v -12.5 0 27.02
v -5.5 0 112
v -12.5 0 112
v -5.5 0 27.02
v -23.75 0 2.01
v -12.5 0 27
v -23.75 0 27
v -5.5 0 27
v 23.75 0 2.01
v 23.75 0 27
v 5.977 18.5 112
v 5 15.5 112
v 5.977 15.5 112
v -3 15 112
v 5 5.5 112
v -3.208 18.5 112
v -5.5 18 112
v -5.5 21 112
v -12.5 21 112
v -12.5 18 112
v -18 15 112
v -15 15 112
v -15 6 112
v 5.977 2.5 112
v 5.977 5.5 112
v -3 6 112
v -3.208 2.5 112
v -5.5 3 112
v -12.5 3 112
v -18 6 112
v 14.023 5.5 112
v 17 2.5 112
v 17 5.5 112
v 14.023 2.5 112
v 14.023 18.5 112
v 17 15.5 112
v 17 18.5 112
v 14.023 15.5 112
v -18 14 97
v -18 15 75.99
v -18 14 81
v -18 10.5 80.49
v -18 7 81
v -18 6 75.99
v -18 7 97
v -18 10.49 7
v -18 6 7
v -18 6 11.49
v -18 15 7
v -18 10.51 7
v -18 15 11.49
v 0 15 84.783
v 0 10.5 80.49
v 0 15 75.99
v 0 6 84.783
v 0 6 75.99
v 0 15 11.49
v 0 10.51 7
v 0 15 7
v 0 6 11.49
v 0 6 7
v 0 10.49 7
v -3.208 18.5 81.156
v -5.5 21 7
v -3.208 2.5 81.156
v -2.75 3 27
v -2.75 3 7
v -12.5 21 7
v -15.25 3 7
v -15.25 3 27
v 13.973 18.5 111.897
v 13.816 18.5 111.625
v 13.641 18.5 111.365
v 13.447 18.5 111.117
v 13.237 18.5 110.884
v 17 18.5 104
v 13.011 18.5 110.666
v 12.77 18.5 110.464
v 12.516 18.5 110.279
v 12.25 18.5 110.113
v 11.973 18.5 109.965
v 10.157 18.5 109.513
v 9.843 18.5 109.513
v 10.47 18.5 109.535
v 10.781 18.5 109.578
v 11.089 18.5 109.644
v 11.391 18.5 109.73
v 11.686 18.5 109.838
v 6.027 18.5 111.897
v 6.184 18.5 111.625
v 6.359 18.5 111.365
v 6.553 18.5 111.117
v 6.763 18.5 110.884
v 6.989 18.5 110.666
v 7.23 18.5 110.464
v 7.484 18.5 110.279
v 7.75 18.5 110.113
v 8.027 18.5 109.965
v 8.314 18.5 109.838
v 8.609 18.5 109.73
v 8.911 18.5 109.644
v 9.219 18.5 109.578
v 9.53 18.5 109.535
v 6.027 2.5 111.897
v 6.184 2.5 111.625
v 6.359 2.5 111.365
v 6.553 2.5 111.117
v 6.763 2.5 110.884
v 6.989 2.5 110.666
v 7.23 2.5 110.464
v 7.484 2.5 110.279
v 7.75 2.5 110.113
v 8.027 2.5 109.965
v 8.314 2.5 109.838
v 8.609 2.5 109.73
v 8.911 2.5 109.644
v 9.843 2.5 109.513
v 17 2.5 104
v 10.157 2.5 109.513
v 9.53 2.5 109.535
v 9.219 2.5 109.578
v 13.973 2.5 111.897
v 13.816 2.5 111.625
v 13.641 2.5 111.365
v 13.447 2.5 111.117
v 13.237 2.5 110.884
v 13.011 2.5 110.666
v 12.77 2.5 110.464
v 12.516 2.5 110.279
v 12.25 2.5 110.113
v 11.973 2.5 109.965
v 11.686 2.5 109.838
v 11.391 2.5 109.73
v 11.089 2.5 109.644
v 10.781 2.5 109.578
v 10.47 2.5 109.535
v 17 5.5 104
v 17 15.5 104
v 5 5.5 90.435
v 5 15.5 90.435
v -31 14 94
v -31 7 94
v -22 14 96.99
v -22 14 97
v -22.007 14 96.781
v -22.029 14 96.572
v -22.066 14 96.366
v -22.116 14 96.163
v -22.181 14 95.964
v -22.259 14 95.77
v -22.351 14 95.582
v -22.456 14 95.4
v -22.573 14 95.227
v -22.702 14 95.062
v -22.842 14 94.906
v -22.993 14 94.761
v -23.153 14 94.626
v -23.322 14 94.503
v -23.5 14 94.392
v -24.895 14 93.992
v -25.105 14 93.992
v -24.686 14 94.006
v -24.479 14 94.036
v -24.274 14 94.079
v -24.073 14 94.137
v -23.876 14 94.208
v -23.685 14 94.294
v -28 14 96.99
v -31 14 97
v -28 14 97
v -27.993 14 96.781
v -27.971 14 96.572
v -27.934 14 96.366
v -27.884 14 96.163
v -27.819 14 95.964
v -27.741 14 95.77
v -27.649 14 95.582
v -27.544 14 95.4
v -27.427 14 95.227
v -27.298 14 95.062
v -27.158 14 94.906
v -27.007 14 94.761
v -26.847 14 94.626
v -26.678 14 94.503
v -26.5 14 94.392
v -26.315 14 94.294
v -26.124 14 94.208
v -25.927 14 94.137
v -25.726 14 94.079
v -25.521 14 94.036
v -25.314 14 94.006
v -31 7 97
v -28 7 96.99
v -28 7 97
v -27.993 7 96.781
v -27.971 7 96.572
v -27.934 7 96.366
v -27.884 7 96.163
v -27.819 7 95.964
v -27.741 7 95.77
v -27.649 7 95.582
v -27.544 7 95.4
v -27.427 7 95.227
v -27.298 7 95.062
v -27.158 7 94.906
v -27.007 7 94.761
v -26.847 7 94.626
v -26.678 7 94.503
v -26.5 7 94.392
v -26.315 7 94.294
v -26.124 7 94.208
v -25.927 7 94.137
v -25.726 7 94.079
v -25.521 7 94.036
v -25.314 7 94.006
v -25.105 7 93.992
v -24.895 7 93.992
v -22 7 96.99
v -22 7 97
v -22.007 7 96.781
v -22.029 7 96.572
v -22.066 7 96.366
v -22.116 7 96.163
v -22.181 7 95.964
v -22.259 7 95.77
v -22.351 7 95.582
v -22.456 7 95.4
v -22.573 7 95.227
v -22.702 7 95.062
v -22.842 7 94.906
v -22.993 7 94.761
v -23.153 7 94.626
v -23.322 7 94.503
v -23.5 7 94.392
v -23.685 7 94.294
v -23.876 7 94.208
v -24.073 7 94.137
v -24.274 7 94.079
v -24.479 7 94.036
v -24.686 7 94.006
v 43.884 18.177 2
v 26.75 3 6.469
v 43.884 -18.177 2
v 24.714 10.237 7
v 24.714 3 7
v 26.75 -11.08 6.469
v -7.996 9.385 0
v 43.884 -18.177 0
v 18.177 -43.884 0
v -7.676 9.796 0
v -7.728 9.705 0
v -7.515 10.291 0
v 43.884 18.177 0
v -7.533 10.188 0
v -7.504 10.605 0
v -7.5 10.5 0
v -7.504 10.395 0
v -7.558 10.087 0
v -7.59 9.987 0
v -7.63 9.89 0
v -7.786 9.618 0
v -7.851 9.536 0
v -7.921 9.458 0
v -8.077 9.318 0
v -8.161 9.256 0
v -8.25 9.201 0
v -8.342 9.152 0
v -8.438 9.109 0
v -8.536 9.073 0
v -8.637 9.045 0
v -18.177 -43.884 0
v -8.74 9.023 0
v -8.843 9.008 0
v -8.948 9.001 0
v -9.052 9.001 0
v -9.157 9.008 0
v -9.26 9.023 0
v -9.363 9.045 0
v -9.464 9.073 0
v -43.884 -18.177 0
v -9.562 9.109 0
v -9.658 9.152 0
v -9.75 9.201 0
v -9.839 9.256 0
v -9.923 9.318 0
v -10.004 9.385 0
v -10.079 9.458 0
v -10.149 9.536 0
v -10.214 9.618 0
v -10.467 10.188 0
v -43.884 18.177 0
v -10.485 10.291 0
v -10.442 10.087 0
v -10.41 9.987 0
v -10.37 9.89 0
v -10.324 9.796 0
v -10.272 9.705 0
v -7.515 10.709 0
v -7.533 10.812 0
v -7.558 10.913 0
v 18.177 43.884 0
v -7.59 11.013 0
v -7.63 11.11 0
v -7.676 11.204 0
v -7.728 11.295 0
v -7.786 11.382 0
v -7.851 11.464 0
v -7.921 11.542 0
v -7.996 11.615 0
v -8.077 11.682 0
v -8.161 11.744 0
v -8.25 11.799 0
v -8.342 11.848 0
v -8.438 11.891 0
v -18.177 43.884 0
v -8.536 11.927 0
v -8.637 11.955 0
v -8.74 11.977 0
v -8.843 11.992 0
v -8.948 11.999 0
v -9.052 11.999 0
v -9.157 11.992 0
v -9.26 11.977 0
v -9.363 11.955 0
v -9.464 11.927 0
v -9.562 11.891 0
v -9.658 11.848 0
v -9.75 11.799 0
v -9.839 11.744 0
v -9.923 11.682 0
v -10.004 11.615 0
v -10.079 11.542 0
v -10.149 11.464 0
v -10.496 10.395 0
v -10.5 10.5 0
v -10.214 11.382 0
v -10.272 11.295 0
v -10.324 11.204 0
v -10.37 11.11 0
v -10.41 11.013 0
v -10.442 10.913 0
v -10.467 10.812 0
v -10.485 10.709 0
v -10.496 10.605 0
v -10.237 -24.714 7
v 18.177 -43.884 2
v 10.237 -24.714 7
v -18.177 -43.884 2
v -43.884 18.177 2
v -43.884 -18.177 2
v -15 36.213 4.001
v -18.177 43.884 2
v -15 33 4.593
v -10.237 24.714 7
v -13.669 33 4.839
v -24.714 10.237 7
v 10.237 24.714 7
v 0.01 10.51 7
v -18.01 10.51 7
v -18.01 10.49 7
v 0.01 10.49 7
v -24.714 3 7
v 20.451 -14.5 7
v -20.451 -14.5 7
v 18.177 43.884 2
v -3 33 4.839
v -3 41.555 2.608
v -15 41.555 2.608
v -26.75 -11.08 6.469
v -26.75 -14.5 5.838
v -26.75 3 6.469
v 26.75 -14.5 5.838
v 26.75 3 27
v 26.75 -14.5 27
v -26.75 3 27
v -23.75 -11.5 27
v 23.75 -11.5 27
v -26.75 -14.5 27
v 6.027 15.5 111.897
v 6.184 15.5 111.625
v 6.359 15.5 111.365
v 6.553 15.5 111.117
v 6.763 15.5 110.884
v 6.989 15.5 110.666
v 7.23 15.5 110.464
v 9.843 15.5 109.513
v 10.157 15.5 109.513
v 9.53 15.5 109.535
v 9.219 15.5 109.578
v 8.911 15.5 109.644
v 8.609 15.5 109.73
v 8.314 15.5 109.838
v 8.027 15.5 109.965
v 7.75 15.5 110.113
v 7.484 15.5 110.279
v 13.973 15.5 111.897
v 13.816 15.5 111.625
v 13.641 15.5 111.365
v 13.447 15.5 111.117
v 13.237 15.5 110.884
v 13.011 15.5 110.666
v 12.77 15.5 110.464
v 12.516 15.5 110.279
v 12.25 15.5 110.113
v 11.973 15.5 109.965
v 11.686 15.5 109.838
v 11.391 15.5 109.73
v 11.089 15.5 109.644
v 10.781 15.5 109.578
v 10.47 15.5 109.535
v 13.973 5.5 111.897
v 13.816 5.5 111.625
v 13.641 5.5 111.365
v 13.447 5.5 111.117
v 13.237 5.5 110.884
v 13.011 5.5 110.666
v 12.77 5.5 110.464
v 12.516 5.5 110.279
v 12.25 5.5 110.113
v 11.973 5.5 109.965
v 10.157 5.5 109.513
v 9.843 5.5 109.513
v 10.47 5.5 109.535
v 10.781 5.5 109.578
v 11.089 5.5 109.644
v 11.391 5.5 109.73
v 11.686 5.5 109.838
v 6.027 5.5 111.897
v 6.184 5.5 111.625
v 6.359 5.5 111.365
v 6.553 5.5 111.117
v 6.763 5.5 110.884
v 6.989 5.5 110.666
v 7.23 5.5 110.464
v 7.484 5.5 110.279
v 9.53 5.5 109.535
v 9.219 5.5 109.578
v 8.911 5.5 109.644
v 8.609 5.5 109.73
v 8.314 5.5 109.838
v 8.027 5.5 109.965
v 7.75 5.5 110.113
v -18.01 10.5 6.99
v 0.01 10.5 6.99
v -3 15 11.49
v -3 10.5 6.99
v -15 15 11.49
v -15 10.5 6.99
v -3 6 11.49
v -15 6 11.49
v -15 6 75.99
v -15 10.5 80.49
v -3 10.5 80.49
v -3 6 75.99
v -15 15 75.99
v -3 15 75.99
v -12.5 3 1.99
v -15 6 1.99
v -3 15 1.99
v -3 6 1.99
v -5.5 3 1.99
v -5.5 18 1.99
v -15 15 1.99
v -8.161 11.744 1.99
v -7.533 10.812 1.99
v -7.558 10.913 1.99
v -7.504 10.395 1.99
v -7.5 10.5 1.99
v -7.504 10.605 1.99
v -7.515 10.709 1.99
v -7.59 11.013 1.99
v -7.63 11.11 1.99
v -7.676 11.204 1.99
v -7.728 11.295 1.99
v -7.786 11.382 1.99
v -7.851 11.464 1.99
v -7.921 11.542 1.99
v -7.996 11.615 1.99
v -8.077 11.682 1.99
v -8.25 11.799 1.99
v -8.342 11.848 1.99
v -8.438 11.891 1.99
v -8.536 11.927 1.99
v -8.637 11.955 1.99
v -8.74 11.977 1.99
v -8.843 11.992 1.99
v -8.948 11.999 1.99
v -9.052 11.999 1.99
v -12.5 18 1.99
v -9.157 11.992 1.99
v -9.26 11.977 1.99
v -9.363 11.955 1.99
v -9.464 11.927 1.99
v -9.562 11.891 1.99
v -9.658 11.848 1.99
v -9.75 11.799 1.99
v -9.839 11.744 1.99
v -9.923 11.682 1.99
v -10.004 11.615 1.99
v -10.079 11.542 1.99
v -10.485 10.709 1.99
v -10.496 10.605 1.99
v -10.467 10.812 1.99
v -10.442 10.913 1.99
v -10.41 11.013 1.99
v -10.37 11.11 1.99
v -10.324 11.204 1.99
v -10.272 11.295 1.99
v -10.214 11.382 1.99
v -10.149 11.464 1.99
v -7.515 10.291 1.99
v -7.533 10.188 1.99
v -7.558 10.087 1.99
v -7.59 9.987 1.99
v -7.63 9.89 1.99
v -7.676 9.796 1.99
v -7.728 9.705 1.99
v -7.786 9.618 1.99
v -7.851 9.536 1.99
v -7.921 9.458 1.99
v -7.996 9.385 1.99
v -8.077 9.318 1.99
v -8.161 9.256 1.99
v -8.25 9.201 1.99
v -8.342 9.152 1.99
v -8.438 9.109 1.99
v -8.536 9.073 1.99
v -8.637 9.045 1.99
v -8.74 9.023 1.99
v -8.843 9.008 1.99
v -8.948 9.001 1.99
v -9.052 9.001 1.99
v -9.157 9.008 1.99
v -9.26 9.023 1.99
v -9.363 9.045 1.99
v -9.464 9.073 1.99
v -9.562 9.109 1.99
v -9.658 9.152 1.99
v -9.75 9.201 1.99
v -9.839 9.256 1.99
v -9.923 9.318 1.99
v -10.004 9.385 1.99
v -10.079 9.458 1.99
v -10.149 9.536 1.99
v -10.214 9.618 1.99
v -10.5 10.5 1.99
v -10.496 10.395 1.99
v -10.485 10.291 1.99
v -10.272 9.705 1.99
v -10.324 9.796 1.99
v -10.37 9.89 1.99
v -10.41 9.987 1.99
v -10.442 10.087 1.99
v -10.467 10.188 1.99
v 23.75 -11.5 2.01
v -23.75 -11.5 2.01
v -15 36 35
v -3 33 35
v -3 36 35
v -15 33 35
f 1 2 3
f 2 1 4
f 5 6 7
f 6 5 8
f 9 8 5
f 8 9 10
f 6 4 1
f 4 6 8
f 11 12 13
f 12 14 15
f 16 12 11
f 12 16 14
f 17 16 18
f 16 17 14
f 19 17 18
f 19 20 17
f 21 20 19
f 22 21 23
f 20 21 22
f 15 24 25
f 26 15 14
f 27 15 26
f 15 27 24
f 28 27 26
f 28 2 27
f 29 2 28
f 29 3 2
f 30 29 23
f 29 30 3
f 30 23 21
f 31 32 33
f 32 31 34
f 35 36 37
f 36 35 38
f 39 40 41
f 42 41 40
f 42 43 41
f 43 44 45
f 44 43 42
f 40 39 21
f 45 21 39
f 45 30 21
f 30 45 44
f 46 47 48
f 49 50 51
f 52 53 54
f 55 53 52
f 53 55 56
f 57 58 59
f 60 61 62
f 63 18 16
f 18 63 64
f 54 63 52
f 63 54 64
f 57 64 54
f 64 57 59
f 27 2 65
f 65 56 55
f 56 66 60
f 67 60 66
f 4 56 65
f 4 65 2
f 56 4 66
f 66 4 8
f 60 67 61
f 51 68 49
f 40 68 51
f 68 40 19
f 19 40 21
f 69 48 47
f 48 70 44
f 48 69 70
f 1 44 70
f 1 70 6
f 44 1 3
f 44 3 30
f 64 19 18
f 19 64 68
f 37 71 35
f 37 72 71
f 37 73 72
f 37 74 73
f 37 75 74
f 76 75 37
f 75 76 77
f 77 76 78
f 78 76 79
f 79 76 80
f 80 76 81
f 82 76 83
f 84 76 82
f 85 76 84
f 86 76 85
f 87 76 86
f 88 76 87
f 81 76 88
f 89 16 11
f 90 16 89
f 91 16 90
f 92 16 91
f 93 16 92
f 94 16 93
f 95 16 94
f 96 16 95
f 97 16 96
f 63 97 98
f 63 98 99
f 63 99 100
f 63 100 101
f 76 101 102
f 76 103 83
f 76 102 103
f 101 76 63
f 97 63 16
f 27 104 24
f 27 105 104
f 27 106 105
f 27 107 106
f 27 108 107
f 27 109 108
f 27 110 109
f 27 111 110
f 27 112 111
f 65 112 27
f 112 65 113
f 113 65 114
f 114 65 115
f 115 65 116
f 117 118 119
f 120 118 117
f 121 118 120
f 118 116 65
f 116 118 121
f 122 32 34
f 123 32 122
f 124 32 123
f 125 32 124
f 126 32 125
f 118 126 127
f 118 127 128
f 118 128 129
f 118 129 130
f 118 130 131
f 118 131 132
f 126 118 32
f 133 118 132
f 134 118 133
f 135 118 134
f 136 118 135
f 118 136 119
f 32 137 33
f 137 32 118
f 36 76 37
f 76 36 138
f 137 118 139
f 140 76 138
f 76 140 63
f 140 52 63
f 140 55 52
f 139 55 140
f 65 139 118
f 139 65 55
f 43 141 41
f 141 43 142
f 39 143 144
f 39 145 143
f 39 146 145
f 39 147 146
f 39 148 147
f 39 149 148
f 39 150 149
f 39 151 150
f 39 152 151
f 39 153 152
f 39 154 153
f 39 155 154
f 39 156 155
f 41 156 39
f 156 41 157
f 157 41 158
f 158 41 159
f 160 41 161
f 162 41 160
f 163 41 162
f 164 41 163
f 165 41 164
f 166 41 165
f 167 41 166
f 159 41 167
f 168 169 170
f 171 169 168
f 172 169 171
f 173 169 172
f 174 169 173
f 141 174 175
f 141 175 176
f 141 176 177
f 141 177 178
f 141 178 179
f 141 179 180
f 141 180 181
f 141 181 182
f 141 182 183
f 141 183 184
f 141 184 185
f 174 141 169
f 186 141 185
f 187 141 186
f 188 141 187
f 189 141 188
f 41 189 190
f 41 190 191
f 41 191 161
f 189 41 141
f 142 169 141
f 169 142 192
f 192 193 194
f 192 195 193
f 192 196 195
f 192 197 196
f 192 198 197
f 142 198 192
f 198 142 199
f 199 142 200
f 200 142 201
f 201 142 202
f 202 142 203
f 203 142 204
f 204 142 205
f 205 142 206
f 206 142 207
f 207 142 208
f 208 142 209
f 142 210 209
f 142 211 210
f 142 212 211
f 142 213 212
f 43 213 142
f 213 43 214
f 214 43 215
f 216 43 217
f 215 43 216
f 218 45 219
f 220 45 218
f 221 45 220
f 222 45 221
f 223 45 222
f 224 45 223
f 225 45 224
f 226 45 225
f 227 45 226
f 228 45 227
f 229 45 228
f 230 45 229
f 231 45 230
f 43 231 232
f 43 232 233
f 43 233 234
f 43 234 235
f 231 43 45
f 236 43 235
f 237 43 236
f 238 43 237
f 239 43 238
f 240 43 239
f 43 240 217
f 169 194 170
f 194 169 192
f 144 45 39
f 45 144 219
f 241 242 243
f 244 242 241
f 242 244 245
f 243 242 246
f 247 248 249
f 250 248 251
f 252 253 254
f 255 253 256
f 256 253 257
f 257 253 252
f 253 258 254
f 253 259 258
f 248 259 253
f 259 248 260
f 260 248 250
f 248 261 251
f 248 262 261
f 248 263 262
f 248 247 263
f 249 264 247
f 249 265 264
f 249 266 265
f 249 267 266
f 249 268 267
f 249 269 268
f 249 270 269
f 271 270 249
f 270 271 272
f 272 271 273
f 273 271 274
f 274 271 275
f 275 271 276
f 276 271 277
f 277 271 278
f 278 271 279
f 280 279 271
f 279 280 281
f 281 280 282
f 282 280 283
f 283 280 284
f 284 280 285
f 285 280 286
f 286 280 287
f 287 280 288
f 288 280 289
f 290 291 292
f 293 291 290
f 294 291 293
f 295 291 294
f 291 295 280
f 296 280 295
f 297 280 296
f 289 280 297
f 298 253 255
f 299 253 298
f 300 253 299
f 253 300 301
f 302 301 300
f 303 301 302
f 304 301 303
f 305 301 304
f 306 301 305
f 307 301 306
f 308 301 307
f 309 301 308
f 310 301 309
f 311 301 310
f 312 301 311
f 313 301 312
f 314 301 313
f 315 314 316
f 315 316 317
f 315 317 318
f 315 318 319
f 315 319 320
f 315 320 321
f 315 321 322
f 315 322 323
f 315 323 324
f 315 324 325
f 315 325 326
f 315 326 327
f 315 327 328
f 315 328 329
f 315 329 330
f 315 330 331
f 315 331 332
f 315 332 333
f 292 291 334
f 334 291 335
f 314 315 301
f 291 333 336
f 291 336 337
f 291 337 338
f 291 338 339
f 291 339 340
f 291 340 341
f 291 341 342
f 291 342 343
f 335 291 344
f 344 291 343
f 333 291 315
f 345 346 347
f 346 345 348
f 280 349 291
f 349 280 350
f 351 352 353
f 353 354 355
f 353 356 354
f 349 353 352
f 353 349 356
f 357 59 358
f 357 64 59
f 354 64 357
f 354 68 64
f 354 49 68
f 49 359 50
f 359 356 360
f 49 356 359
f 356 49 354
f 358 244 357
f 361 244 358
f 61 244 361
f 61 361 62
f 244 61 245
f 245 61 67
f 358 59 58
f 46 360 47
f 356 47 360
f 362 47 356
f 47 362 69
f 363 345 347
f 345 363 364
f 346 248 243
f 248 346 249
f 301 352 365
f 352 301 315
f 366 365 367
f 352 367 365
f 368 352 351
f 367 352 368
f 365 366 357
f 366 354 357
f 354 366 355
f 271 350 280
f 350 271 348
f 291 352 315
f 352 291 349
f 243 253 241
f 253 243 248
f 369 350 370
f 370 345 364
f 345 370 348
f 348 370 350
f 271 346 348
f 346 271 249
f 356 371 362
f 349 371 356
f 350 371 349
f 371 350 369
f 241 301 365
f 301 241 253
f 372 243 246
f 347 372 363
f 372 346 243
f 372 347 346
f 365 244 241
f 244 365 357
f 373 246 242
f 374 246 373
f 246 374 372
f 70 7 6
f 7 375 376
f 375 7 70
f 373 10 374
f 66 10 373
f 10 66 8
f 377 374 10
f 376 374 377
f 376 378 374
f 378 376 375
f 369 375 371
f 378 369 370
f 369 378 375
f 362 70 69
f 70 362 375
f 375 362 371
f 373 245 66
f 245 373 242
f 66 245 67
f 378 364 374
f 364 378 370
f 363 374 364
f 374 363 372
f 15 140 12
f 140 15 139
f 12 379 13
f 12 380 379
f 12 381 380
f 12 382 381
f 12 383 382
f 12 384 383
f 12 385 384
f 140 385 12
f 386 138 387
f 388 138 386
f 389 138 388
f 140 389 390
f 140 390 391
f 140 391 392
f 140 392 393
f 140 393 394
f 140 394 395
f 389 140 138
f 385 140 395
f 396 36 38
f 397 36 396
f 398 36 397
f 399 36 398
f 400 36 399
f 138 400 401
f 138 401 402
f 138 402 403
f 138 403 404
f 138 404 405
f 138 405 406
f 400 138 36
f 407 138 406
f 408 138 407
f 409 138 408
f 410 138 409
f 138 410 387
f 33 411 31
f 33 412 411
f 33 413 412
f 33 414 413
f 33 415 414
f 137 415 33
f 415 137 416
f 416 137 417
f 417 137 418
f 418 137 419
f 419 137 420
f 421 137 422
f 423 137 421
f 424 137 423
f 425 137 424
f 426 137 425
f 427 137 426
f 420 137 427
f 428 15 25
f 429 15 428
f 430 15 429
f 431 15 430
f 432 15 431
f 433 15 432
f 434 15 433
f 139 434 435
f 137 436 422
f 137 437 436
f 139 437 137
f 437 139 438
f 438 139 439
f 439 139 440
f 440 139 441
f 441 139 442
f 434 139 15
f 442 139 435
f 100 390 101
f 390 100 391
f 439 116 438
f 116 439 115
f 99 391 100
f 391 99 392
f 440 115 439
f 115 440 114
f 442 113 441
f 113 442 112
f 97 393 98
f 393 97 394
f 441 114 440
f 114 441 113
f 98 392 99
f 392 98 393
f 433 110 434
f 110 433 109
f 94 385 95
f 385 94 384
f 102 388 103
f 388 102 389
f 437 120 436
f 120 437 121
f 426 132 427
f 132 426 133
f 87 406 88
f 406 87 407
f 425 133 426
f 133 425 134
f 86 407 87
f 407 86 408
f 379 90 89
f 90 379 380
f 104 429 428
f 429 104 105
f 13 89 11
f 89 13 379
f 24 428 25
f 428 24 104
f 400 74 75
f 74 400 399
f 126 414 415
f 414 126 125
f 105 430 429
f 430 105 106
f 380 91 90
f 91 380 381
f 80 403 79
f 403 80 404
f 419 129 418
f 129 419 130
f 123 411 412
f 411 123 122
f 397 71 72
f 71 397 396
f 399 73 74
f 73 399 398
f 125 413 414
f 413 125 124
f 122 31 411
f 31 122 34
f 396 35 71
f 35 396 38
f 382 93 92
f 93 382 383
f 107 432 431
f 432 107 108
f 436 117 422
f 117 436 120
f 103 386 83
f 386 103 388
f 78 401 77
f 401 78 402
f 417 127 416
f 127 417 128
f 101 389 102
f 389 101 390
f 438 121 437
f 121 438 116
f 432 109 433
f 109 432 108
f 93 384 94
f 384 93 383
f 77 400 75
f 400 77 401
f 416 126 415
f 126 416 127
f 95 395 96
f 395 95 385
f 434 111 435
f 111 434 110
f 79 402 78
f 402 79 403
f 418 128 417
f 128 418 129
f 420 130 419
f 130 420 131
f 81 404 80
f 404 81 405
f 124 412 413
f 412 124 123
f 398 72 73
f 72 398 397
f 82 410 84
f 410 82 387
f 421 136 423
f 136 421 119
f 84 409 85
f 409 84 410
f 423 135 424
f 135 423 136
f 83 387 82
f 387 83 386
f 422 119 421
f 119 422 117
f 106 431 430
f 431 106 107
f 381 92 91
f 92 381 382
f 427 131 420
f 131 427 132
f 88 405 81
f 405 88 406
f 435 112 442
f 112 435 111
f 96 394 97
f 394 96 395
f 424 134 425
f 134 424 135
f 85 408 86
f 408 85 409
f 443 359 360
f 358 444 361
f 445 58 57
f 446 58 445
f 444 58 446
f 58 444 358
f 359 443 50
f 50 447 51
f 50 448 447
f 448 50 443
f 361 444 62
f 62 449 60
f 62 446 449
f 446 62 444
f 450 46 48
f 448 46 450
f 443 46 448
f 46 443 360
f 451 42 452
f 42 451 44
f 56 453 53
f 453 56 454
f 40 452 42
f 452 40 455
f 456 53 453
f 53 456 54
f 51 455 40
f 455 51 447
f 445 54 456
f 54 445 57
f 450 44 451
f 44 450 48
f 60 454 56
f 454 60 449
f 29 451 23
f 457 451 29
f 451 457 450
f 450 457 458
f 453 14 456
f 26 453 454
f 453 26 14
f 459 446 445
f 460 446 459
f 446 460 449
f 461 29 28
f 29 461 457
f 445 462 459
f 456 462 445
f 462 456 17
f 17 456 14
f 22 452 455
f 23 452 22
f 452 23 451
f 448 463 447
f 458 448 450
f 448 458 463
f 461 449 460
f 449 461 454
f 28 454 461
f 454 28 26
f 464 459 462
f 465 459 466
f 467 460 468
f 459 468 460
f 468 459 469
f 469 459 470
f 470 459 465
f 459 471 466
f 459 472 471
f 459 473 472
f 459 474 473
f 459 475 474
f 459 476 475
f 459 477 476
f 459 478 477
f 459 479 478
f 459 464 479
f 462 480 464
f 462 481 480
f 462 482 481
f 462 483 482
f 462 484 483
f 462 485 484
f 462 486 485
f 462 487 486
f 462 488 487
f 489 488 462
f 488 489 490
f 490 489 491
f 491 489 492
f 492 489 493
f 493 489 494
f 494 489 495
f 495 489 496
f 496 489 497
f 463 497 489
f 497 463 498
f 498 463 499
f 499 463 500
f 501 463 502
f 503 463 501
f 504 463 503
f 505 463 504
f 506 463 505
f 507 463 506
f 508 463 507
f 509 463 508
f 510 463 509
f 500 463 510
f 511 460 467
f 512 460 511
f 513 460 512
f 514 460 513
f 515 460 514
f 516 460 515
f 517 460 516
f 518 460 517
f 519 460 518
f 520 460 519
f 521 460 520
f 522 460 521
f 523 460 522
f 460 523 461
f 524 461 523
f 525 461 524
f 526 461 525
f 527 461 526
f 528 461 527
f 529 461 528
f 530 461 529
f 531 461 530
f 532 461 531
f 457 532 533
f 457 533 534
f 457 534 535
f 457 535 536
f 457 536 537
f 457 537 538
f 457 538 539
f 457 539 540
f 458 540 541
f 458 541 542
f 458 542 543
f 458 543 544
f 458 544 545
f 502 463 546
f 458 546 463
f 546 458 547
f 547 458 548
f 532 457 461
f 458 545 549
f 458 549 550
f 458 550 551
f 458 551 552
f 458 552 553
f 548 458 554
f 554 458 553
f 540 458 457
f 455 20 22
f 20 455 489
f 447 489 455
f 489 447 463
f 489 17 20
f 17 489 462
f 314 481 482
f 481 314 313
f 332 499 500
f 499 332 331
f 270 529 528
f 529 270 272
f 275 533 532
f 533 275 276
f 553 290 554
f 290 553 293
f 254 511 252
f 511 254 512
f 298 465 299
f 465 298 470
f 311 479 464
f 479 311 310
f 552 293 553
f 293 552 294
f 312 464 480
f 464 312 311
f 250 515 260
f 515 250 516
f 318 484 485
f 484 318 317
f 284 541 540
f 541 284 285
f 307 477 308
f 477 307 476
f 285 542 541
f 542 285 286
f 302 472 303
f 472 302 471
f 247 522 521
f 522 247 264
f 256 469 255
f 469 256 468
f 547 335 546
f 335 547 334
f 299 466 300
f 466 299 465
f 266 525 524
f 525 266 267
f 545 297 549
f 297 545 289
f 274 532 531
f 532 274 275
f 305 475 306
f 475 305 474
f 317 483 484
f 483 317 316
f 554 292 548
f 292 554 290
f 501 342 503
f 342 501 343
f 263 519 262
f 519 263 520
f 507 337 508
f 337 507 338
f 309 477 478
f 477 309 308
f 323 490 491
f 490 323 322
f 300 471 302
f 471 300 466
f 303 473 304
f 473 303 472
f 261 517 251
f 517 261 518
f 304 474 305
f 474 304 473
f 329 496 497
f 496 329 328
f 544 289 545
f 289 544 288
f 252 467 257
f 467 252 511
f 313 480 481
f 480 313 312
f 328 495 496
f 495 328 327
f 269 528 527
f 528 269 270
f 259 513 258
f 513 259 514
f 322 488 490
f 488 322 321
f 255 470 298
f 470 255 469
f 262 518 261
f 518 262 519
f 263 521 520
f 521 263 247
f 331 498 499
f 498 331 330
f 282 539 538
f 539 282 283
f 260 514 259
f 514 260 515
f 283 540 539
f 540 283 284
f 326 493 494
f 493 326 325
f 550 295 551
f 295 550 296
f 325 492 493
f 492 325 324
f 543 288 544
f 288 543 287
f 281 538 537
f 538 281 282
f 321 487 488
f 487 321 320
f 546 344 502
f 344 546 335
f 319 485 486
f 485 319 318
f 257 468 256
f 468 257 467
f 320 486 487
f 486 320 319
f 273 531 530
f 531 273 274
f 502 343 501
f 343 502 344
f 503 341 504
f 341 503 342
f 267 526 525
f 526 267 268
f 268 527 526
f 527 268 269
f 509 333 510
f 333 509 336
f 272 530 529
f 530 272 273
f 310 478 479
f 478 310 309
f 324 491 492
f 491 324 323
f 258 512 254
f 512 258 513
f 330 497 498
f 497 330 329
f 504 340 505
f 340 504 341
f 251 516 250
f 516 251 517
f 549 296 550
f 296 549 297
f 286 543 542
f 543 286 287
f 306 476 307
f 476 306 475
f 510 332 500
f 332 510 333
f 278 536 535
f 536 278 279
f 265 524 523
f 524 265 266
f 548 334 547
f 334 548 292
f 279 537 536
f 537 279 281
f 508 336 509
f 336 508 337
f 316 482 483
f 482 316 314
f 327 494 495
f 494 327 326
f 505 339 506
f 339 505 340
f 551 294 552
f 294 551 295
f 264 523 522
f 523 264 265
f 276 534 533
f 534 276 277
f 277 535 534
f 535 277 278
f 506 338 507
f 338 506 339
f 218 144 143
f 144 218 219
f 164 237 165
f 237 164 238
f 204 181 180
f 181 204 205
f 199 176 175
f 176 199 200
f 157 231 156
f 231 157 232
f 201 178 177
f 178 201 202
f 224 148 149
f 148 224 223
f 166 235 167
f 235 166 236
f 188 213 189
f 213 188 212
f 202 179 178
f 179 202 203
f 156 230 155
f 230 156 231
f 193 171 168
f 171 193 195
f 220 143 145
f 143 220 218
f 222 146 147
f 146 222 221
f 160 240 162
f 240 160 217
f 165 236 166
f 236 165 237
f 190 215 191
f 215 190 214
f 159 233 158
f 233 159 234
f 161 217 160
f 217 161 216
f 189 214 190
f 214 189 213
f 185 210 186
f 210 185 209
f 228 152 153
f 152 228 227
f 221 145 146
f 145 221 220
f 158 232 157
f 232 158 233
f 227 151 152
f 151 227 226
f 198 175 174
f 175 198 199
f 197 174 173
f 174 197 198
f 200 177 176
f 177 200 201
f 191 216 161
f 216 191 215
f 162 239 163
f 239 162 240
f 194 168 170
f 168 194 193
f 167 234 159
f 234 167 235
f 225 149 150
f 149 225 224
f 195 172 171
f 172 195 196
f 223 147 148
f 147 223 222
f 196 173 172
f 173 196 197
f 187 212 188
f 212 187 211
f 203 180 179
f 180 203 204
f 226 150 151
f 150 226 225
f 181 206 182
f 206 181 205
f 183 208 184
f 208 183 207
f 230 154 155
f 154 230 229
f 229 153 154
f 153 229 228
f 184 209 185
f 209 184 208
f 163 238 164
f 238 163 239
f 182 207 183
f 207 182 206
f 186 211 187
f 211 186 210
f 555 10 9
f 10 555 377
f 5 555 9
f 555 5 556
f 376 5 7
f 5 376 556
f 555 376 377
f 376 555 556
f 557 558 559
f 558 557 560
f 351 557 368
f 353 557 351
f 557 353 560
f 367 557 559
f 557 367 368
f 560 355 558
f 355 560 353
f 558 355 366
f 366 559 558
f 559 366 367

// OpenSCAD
eps = 0.01;
$fn = 90;

// parameters
// base diameters
b_d = 95;
// base thickness
b_t = 2;
// base rising
b_r = 5;

// general parameters
// wall thickness
wt = 3;

// accessories dimensions
// rasor blade storage dimensions
rb_x = 47.5;
rb_y = 11.5;
rb_z = 72;
rb_h = 25;

// razor dimension
r_x = 9;
//r_y = 9;
//r_y = 11;
r_y = 10;
r_o = 5;
r_z = 110;
r_d = 5;
r_do = 3;
r_t = 5+r_do;

// toothbrush dimensions
tb_X = 12;
tb_x = 7;
tb_Y = 15;
tb_y = 9;
tb_z = 110;

// contact lens case paremeters
clc_t = 12;
clc_h = 35;

// interdental brush paramters
ib_t = 6;
ib_w = 7;
ib_o = 4;

// possible extention into separete module
module base()
{
    hull()
    {
        cylinder(d=b_d, h=b_t, $fn=8);
        translate([0,0,b_t])
            cylinder(d=rb_x+2*wt, h=b_r, $fn=8);
    }
    
}

module holder()
{
    difference()
    {
        union()
        {
            // base
            rotate([0,0,22.5]) base();
            
            // toothbrush block
            translate([tb_X/2+wt-tb_X-2*wt,tb_Y/2+wt,b_t])
            {
                hull()
                {
                    // vertical
                    translate([-tb_x/2, -tb_Y/2-wt, 0])
                        cube([tb_x, tb_Y+2*wt, tb_z]);
                    // horizontal
                    translate([-tb_X/2-wt, -tb_y/2, 0])
                        cube([tb_X+2*wt, tb_y, tb_z]);
                }
                
                // razor hook
                hull()
                {
                    // razor hook
                    translate([tb_X/2+2*wt,-r_y/2-wt,r_z-r_t])
                        cube([r_o+r_x,r_y+2*wt,r_t]);
                    
                    // razor hook support
                    translate([0,
                                -r_y/2-wt,
                                r_z-r_o-r_x-r_t-tb_X/2-2*wt])
                        cube([  wt,
                                r_y+2*wt,
                                r_o+r_x+r_t+tb_X/2+2*wt]);
                }
                
                // interdental hook
                translate([-tb_X/2-wt,-ib_w/2,tb_z-(2*wt+ib_t+ib_o)-15])
                hull()
                {
                    cube([wt,ib_w,2*wt+ib_t+ib_o]);
                    translate([-ib_t-ib_o-wt,0,wt+ib_t+ib_o])
                        cube([2*wt+ib_t+ib_o,ib_w,wt]);
                }
                
                
            }
            
            // razor blades stock holder
            translate([-rb_x/2-wt,-rb_y-wt,b_t])
                cube([rb_x+2*wt,rb_y+2*wt,rb_h]);
        }
        
        // toothbrush hole
        translate([tb_X/2+wt-tb_X-2*wt,tb_Y/2+wt,b_t-eps])
        {
            hull()
            {
                // vertical
                translate([-tb_x/2, -tb_Y/2, 0])
                    cube([tb_x, tb_Y, tb_z+2*eps]);
                // horizontal
                translate([-tb_X/2, -tb_y/2, 0])
                    cube([tb_X, tb_y, tb_z+2*eps]);
            }
        
            // blade hole
            translate([tb_X/2+wt+r_o,-r_y/2,b_r+2*eps])
            {
                cube([r_x+wt+eps,r_y,r_z+eps]);
                
                // deeping
                translate([r_o,-wt-eps,r_z-b_r-r_do+r_d])
                    rotate([-90,0,0])
                        cylinder(h=r_y+2*wt+2*eps,d=r_x);
            
            }
            
            // water hole
            _wh_d = (tb_X-wt)/sqrt(2); 
            translate([-tb_X/2-wt-eps,0,b_r])
            {
                _a = _wh_d;
                // lower side cut
                rotate([45,0,0])
                    cube([tb_X+2*wt+2*eps,_a,_a]);
                _l = tb_z-(r_o+r_x+r_t+tb_X/2+2*wt)-b_r-(tb_X-wt)/2-2;
                // upper side cut
                translate([0,0,_l])
                    rotate([45,0,0])
                        cube([tb_X+2*wt+2*eps,_a,_a]);
                // middle section
                translate([0,-(tb_X-wt)/2,(tb_X-wt)/2])
                    cube([tb_X+2*wt+2*eps,tb_X-wt,_l]);
                
                //rotate([0,90,0])
                //    rotate([0,0,0])
                //        cylinder(h=tb_X+2*wt+2*eps,d=_wh_d);
            }
            // vertical hole
            translate([0,0,-b_t-wt])
                cylinder(d=wt,h=b_r+2*eps);
            
            // interdental brush hooks
            translate([-tb_X/2-wt-ib_o-ib_t/2,ib_w/2+eps,tb_z-15])
                rotate([90,0,0])
                    cylinder(d=ib_t,h=ib_w+2*eps);
        }
        
        // razor blade storage hole
        translate([-rb_x/2,-rb_y,b_t+eps])
            cube([rb_x,rb_y,rb_h+eps]);
    }
    
    // contact lens case holder
    translate([0-tb_X-wt,tb_Y+2*wt+clc_t,0])
    hull()
    {
        cube([tb_X,3*wt,eps]);
        cube([tb_X,wt,clc_h]);
    }
    
}

holder();
